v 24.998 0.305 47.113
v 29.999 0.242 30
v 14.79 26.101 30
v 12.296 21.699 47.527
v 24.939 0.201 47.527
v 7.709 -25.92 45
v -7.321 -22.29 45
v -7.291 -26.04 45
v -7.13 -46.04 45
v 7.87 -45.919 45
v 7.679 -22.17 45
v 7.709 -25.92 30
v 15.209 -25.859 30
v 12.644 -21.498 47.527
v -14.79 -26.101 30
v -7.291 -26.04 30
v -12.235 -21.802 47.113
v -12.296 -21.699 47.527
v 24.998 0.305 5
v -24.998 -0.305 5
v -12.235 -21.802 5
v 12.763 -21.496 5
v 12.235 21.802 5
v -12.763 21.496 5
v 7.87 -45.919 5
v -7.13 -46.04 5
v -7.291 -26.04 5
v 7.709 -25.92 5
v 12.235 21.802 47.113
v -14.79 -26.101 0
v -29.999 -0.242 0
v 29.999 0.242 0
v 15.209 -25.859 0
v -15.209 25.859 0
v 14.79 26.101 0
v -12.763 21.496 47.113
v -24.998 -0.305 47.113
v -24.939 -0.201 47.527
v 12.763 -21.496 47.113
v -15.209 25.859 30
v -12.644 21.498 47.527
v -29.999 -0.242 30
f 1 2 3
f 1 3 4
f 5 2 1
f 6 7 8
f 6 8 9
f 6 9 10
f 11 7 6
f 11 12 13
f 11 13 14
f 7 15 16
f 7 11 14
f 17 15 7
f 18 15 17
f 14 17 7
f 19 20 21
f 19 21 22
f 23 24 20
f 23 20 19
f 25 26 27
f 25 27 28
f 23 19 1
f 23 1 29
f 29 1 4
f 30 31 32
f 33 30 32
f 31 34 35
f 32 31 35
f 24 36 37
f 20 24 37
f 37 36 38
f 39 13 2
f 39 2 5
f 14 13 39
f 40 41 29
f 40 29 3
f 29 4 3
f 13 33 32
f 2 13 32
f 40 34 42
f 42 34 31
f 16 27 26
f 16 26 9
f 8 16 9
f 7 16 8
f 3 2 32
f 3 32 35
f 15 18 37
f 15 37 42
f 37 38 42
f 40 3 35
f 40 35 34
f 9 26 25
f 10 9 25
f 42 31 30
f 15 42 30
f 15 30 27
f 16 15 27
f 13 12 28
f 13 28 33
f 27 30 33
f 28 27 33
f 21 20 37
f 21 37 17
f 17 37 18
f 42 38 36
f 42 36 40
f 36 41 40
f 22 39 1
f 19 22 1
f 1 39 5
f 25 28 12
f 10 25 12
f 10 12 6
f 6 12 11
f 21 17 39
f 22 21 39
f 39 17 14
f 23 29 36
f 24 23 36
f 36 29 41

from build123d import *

# Parameters (mm, degrees)
F1_DEPTH     = 50
F3_DEPTH     = 45
F4_W         = 15
F4_H         = 40
F5_DEPTH     = 20
F6_T1_DEPTH  = 133.8850999909
F6_T3_DEPTH  = 133.8850999909
F6_T5_DEPTH  = 133.8850999909
F6_T10_DEPTH = 133.8850999909
F6_T15_DEPTH = 133.8850999909
F6_T20_DEPTH = 133.8850999909
F6_T25_DEPTH = 133.8850999909
F6_T30_DEPTH = 133.8850999909


# Not quite as in the source:
# - a fillet or chamfer that OpenCascade refuses, or shapes differently, is made with other operations: its cross-section is extruded or revolved along the edge and cut away or added


with BuildPart() as f1:
    # F0 (on Top) → F1 (new body)
    with BuildSketch(Plane.XY):
        Polygon((29.9990277389, 0.2415258118), (14.7903463808, 26.1006830166), (-15.2086813581, 25.8591572049), (-29.9990277389, -0.2415258118), (-14.7903463808, -26.1006830166), (15.2086813581, -25.8591572049), align=None)
    extrude(amount=F1_DEPTH)

    # F2 (on face) → F3 (cut)
    with BuildSketch(Plane.XY.offset(50)):
        Polygon((24.9981357174, 0.3053041981), (12.2346666673, 21.8016726776), (-12.7634690502, 21.4963684795), (-24.9981357174, -0.3053041981), (-12.2346666673, -21.8016726776), (12.7634690502, -21.4963684795), align=None)
    extrude(amount=-F3_DEPTH, mode=Mode.SUBTRACT)

    # F4 (on face) → F5 (join)
    with BuildSketch(Plane(origin=(0.2091674886, -25.9799201108, 0), x_dir=(0.9999675913, 0.0080508604, 0), z_dir=(0.0080508604, -0.9999675913, 0))):
        with Locations((0, 25)):
            Rectangle(F4_W, F4_H)
    extrude(amount=F5_DEPTH)

    # F6: chamfer of 20 x 5 on 6 edges, made by hand

    # F6_s2 → F6_t1 (cut)
    with BuildSketch(Plane(origin=(33.0034500683, 58.2415425919, 0), x_dir=(0, 0, 1), z_dir=(-0.493011546, -0.8700227672, 0))):
        Polygon((50, 20.9807621135), (30, 25.9807621135), (50, 25.9807621135), align=None)
    extrude(amount=F6_T1_DEPTH, mode=Mode.SUBTRACT)

    # F6_s4 → F6_t3 (cut)
    with BuildSketch(Plane(origin=(66.9403804743, 0.5389451243, 0), x_dir=(0, 0, 1), z_dir=(-0.9999675913, -0.0080508604, 0))):
        Polygon((50, 20.9807621135), (30, 25.9807621135), (50, 25.9807621135), align=None)
    extrude(amount=F6_T3_DEPTH, mode=Mode.SUBTRACT)

    # F6_s6 → F6_t5 (cut)
    with BuildSketch(Plane(origin=(33.936930406, -57.7025974676, 0), x_dir=(0, 0, 1), z_dir=(-0.5069560453, 0.8619719068, 0))):
        Polygon((30, 25.9807621135), (50, 20.9807621135), (50, 25.9807621135), align=None)
    extrude(amount=F6_T5_DEPTH, mode=Mode.SUBTRACT)


with BuildPart() as f6_tool8:
    # F6_s9 → F6_t10 (new body)
    with BuildSketch(Plane(origin=(-33.0034500683, -58.2415425919, 0), x_dir=(0, 0, 1), z_dir=(0.493011546, 0.8700227672, 0))):
        Polygon((30, 25.9807621135), (50, 20.9807621135), (50, 25.9807621135), align=None)
    extrude(amount=F6_T10_DEPTH)

    split(bisect_by=Plane(origin=(7.4997569347, 0.0603814529, 0), x_dir=(0, 0, 1), z_dir=(0.9999675913, 0.0080508604, 0)), keep=Keep.TOP)


with BuildPart() as f1_1:
    add(f1.part)

    # F6_t7: cut F6_tool8
    add(f6_tool8.part, mode=Mode.SUBTRACT)


with BuildPart() as f6_tool13:
    # F6_s14 → F6_t15 (new body)
    with BuildSketch(Plane(origin=(-66.9403804743, -0.5389451243, 0), x_dir=(0, 0, 1), z_dir=(0.9999675913, 0.0080508604, 0))):
        Polygon((30, 25.9807621135), (50, 20.9807621135), (50, 25.9807621135), align=None)
    extrude(amount=F6_T15_DEPTH)

    split(bisect_by=Plane(origin=(-7.4997569347, -0.0603814529, 0), x_dir=(0, 0, 1), z_dir=(-0.9999675913, -0.0080508604, 0)), keep=Keep.TOP)


with BuildPart() as f1_2:
    add(f1_1.part)

    # F6_t12: cut F6_tool13
    add(f6_tool13.part, mode=Mode.SUBTRACT)


with BuildPart() as f6_tool18:
    # F6_s19 → F6_t20 (new body)
    with BuildSketch(Plane(origin=(-66.9403804743, -0.5389451243, 0), x_dir=(0, 0, 1), z_dir=(0.9999675913, 0.0080508604, 0))):
        Polygon((30, 25.9807621135), (50, 20.9807621135), (50, 25.9807621135), align=None)
    extrude(amount=F6_T20_DEPTH)

    split(bisect_by=Plane.XY.offset(45), keep=Keep.TOP)


with BuildPart() as f1_3:
    add(f1_2.part)

    # F6_t17: cut F6_tool18
    add(f6_tool18.part, mode=Mode.SUBTRACT)


with BuildPart() as f6_tool23:
    # F6_s24 → F6_t25 (new body)
    with BuildSketch(Plane(origin=(-66.9403804743, -0.5389451243, 0), x_dir=(0, 0, 1), z_dir=(0.9999675913, 0.0080508604, 0))):
        Polygon((30, 25.9807621135), (50, 20.9807621135), (50, 25.9807621135), align=None)
    extrude(amount=F6_T25_DEPTH)

    split(bisect_by=Plane(origin=(7.4997569347, 0.0603814529, 0), x_dir=(0, 0, 1), z_dir=(0.9999675913, 0.0080508604, 0)), keep=Keep.TOP)


with BuildPart() as f1_4:
    add(f1_3.part)

    # F6_t22: cut F6_tool23
    add(f6_tool23.part, mode=Mode.SUBTRACT)


with BuildPart() as f6_tool28:
    # F6_s29 → F6_t30 (new body)
    with BuildSketch(Plane(origin=(-33.936930406, 57.7025974676, 0), x_dir=(0, 0, 1), z_dir=(0.5069560453, -0.8619719068, 0))):
        Polygon((50, 20.9807621135), (30, 25.9807621135), (50, 25.9807621135), align=None)
    extrude(amount=F6_T30_DEPTH)

    split(bisect_by=Plane(origin=(-7.4997569347, -0.0603814529, 0), x_dir=(0, 0, 1), z_dir=(-0.9999675913, -0.0080508604, 0)), keep=Keep.TOP)


with BuildPart() as f1_5:
    add(f1_4.part)

    # F6_t27: cut F6_tool28
    add(f6_tool28.part, mode=Mode.SUBTRACT)


solid = f1_5.part
